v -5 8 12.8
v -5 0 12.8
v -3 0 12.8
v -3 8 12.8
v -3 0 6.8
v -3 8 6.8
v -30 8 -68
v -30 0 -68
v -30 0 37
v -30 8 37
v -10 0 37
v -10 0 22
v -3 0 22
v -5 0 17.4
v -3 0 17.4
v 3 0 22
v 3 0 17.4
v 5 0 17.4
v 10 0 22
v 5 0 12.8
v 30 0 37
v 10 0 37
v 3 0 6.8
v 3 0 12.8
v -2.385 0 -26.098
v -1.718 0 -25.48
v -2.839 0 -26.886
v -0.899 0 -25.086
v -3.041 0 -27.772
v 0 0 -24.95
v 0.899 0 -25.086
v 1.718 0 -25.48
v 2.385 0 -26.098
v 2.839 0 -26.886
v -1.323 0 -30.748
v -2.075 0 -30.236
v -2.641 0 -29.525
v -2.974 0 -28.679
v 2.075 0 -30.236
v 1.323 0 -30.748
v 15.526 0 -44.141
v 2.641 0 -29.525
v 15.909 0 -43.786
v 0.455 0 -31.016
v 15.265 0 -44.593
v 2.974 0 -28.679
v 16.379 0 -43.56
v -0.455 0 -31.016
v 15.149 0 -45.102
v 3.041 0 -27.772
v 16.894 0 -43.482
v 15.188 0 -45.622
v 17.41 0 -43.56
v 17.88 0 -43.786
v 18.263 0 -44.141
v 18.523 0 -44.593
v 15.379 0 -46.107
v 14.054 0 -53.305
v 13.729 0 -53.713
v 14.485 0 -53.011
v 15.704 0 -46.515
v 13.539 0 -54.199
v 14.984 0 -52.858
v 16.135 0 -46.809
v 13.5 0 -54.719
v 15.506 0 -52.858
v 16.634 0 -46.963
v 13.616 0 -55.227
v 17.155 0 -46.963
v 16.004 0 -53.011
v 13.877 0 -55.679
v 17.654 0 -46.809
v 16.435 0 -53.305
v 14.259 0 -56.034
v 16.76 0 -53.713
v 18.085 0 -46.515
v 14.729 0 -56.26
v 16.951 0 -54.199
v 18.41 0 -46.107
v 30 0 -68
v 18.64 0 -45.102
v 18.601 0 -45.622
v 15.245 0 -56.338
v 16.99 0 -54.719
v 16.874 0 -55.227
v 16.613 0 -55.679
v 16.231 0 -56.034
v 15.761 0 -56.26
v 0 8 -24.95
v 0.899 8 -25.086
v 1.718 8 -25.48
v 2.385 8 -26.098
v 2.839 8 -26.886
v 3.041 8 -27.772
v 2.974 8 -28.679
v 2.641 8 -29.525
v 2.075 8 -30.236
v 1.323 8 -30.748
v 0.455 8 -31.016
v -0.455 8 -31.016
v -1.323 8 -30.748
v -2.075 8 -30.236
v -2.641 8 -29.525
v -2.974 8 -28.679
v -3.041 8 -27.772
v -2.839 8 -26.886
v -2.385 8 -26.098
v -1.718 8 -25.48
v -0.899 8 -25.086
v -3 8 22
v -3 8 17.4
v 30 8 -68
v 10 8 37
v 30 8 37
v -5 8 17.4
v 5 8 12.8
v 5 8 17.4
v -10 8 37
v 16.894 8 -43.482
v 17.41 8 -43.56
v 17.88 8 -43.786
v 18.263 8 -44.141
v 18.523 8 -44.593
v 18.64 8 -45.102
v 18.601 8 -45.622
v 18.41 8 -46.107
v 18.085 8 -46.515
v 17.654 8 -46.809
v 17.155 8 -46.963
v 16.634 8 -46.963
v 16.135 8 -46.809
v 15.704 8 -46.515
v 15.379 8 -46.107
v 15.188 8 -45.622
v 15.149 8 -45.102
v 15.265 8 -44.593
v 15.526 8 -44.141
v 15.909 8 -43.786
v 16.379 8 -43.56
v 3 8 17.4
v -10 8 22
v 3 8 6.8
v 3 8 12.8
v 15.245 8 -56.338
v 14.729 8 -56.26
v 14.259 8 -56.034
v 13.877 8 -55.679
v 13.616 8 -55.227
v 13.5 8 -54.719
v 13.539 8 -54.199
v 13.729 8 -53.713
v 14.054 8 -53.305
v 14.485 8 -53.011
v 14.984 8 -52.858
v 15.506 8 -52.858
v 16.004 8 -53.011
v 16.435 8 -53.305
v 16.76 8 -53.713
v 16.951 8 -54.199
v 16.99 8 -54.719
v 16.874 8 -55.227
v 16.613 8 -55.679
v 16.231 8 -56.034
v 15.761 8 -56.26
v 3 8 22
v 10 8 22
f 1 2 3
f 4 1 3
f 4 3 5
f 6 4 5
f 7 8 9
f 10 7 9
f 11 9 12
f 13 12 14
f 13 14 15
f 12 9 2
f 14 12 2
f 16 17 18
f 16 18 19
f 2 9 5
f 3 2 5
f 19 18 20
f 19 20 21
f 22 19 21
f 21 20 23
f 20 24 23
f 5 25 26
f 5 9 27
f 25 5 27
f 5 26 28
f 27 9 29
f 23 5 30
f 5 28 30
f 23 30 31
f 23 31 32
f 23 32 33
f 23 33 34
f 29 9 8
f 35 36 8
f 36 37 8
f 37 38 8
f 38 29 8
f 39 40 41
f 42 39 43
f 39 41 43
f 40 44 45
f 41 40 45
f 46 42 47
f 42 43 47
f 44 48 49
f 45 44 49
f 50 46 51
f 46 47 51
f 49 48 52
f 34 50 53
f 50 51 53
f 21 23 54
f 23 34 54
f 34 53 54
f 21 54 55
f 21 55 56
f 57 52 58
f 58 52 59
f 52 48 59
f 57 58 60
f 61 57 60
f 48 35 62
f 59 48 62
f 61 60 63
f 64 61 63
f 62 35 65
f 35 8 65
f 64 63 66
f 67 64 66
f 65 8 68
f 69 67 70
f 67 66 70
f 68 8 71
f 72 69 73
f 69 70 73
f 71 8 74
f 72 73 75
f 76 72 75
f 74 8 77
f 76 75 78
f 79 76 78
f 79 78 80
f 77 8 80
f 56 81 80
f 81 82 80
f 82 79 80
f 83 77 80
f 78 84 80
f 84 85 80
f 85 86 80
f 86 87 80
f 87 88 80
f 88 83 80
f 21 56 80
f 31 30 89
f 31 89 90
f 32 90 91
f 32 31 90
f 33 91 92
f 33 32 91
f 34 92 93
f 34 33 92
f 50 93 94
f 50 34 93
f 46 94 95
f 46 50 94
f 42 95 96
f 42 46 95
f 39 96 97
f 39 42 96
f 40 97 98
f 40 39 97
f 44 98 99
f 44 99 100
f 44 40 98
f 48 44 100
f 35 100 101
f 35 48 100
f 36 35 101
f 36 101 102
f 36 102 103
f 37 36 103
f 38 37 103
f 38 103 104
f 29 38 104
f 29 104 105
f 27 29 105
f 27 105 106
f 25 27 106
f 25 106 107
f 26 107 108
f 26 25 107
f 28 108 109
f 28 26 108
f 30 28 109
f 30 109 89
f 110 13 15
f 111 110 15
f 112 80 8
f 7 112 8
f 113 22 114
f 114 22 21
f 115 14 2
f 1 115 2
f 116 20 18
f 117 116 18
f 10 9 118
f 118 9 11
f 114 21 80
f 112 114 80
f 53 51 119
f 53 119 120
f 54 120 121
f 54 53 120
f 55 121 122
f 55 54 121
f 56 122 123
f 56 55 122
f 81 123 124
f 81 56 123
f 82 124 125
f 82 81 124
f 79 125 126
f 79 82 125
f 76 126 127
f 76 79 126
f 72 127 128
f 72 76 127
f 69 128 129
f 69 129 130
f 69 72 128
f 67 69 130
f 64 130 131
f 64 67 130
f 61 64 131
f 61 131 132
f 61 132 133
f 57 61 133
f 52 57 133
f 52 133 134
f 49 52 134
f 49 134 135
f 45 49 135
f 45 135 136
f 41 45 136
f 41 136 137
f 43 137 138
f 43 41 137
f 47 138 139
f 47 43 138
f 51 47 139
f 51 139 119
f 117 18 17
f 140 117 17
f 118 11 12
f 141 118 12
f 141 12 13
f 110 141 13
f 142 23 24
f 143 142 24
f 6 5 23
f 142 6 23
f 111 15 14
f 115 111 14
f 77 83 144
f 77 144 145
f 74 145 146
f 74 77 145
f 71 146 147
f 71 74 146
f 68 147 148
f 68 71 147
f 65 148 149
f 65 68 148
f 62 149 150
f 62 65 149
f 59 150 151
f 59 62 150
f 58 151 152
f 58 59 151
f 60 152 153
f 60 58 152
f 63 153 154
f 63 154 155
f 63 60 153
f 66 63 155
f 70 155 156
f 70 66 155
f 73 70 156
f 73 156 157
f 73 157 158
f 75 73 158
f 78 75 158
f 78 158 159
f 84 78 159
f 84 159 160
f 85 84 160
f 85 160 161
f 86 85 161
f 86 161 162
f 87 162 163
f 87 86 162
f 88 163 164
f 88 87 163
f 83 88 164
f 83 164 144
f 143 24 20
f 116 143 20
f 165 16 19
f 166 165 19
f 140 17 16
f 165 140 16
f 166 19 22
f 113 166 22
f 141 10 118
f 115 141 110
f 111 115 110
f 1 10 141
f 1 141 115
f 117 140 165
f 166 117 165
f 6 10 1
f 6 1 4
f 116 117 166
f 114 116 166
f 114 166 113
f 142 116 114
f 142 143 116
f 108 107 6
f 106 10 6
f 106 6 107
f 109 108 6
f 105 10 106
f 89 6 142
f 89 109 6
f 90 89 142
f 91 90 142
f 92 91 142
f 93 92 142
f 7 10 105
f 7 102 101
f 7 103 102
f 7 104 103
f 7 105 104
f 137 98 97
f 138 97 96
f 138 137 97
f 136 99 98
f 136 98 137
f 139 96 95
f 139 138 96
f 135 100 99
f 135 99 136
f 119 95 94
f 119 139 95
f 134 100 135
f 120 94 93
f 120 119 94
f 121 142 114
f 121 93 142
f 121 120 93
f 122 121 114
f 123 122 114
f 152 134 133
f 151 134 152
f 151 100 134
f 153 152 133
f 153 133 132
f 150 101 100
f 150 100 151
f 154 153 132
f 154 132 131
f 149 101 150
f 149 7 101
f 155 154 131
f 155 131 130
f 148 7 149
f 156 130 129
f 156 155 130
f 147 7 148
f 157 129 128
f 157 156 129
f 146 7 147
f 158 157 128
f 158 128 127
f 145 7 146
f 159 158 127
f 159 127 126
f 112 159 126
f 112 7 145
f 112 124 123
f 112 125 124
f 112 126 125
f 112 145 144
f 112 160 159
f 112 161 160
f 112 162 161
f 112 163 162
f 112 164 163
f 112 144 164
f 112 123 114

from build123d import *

# Parameters (mm, degrees)
SKETCH1_R           = 3.05
SKETCH1_R_2         = 1.75
BOSS_EXTRUDE1_DEPTH = 8


with BuildPart() as part:
    # Sketch1 → Boss-Extrude1 (new body)
    with BuildSketch(Plane(origin=(0, 0, 0), x_dir=(1, 0, 0), z_dir=(0, 1, 0))):
        Polygon((-10, -37), (-10, -22), (-3, -22), (-3, -17.4), (-5, -17.4), (-5, -12.8), (-3, -12.8), (-3, -6.8), (3, -6.8), (3, -12.8), (5, -12.8), (5, -17.4), (3, -17.4), (3, -22), (10, -22), (10, -37), (30, -37), (30, 38), (30, 58), (30, 68), (-30, 68), (-30, 58), (-30, 38), (-30, -37), align=None)
        with Locations(Location((0, 28, 0), (0, 0, 270))):
            Circle(SKETCH1_R, mode=Mode.SUBTRACT)
        with Locations(Location((16.89444432, 45.232293128, 0), (0, 0, 270))):
            Circle(SKETCH1_R_2, mode=Mode.SUBTRACT)
        with Locations(Location((15.244786632, 54.587966781, 0), (0, 0, 90))):
            Circle(SKETCH1_R_2, mode=Mode.SUBTRACT)
    extrude(amount=BOSS_EXTRUDE1_DEPTH)


solid = part.part
